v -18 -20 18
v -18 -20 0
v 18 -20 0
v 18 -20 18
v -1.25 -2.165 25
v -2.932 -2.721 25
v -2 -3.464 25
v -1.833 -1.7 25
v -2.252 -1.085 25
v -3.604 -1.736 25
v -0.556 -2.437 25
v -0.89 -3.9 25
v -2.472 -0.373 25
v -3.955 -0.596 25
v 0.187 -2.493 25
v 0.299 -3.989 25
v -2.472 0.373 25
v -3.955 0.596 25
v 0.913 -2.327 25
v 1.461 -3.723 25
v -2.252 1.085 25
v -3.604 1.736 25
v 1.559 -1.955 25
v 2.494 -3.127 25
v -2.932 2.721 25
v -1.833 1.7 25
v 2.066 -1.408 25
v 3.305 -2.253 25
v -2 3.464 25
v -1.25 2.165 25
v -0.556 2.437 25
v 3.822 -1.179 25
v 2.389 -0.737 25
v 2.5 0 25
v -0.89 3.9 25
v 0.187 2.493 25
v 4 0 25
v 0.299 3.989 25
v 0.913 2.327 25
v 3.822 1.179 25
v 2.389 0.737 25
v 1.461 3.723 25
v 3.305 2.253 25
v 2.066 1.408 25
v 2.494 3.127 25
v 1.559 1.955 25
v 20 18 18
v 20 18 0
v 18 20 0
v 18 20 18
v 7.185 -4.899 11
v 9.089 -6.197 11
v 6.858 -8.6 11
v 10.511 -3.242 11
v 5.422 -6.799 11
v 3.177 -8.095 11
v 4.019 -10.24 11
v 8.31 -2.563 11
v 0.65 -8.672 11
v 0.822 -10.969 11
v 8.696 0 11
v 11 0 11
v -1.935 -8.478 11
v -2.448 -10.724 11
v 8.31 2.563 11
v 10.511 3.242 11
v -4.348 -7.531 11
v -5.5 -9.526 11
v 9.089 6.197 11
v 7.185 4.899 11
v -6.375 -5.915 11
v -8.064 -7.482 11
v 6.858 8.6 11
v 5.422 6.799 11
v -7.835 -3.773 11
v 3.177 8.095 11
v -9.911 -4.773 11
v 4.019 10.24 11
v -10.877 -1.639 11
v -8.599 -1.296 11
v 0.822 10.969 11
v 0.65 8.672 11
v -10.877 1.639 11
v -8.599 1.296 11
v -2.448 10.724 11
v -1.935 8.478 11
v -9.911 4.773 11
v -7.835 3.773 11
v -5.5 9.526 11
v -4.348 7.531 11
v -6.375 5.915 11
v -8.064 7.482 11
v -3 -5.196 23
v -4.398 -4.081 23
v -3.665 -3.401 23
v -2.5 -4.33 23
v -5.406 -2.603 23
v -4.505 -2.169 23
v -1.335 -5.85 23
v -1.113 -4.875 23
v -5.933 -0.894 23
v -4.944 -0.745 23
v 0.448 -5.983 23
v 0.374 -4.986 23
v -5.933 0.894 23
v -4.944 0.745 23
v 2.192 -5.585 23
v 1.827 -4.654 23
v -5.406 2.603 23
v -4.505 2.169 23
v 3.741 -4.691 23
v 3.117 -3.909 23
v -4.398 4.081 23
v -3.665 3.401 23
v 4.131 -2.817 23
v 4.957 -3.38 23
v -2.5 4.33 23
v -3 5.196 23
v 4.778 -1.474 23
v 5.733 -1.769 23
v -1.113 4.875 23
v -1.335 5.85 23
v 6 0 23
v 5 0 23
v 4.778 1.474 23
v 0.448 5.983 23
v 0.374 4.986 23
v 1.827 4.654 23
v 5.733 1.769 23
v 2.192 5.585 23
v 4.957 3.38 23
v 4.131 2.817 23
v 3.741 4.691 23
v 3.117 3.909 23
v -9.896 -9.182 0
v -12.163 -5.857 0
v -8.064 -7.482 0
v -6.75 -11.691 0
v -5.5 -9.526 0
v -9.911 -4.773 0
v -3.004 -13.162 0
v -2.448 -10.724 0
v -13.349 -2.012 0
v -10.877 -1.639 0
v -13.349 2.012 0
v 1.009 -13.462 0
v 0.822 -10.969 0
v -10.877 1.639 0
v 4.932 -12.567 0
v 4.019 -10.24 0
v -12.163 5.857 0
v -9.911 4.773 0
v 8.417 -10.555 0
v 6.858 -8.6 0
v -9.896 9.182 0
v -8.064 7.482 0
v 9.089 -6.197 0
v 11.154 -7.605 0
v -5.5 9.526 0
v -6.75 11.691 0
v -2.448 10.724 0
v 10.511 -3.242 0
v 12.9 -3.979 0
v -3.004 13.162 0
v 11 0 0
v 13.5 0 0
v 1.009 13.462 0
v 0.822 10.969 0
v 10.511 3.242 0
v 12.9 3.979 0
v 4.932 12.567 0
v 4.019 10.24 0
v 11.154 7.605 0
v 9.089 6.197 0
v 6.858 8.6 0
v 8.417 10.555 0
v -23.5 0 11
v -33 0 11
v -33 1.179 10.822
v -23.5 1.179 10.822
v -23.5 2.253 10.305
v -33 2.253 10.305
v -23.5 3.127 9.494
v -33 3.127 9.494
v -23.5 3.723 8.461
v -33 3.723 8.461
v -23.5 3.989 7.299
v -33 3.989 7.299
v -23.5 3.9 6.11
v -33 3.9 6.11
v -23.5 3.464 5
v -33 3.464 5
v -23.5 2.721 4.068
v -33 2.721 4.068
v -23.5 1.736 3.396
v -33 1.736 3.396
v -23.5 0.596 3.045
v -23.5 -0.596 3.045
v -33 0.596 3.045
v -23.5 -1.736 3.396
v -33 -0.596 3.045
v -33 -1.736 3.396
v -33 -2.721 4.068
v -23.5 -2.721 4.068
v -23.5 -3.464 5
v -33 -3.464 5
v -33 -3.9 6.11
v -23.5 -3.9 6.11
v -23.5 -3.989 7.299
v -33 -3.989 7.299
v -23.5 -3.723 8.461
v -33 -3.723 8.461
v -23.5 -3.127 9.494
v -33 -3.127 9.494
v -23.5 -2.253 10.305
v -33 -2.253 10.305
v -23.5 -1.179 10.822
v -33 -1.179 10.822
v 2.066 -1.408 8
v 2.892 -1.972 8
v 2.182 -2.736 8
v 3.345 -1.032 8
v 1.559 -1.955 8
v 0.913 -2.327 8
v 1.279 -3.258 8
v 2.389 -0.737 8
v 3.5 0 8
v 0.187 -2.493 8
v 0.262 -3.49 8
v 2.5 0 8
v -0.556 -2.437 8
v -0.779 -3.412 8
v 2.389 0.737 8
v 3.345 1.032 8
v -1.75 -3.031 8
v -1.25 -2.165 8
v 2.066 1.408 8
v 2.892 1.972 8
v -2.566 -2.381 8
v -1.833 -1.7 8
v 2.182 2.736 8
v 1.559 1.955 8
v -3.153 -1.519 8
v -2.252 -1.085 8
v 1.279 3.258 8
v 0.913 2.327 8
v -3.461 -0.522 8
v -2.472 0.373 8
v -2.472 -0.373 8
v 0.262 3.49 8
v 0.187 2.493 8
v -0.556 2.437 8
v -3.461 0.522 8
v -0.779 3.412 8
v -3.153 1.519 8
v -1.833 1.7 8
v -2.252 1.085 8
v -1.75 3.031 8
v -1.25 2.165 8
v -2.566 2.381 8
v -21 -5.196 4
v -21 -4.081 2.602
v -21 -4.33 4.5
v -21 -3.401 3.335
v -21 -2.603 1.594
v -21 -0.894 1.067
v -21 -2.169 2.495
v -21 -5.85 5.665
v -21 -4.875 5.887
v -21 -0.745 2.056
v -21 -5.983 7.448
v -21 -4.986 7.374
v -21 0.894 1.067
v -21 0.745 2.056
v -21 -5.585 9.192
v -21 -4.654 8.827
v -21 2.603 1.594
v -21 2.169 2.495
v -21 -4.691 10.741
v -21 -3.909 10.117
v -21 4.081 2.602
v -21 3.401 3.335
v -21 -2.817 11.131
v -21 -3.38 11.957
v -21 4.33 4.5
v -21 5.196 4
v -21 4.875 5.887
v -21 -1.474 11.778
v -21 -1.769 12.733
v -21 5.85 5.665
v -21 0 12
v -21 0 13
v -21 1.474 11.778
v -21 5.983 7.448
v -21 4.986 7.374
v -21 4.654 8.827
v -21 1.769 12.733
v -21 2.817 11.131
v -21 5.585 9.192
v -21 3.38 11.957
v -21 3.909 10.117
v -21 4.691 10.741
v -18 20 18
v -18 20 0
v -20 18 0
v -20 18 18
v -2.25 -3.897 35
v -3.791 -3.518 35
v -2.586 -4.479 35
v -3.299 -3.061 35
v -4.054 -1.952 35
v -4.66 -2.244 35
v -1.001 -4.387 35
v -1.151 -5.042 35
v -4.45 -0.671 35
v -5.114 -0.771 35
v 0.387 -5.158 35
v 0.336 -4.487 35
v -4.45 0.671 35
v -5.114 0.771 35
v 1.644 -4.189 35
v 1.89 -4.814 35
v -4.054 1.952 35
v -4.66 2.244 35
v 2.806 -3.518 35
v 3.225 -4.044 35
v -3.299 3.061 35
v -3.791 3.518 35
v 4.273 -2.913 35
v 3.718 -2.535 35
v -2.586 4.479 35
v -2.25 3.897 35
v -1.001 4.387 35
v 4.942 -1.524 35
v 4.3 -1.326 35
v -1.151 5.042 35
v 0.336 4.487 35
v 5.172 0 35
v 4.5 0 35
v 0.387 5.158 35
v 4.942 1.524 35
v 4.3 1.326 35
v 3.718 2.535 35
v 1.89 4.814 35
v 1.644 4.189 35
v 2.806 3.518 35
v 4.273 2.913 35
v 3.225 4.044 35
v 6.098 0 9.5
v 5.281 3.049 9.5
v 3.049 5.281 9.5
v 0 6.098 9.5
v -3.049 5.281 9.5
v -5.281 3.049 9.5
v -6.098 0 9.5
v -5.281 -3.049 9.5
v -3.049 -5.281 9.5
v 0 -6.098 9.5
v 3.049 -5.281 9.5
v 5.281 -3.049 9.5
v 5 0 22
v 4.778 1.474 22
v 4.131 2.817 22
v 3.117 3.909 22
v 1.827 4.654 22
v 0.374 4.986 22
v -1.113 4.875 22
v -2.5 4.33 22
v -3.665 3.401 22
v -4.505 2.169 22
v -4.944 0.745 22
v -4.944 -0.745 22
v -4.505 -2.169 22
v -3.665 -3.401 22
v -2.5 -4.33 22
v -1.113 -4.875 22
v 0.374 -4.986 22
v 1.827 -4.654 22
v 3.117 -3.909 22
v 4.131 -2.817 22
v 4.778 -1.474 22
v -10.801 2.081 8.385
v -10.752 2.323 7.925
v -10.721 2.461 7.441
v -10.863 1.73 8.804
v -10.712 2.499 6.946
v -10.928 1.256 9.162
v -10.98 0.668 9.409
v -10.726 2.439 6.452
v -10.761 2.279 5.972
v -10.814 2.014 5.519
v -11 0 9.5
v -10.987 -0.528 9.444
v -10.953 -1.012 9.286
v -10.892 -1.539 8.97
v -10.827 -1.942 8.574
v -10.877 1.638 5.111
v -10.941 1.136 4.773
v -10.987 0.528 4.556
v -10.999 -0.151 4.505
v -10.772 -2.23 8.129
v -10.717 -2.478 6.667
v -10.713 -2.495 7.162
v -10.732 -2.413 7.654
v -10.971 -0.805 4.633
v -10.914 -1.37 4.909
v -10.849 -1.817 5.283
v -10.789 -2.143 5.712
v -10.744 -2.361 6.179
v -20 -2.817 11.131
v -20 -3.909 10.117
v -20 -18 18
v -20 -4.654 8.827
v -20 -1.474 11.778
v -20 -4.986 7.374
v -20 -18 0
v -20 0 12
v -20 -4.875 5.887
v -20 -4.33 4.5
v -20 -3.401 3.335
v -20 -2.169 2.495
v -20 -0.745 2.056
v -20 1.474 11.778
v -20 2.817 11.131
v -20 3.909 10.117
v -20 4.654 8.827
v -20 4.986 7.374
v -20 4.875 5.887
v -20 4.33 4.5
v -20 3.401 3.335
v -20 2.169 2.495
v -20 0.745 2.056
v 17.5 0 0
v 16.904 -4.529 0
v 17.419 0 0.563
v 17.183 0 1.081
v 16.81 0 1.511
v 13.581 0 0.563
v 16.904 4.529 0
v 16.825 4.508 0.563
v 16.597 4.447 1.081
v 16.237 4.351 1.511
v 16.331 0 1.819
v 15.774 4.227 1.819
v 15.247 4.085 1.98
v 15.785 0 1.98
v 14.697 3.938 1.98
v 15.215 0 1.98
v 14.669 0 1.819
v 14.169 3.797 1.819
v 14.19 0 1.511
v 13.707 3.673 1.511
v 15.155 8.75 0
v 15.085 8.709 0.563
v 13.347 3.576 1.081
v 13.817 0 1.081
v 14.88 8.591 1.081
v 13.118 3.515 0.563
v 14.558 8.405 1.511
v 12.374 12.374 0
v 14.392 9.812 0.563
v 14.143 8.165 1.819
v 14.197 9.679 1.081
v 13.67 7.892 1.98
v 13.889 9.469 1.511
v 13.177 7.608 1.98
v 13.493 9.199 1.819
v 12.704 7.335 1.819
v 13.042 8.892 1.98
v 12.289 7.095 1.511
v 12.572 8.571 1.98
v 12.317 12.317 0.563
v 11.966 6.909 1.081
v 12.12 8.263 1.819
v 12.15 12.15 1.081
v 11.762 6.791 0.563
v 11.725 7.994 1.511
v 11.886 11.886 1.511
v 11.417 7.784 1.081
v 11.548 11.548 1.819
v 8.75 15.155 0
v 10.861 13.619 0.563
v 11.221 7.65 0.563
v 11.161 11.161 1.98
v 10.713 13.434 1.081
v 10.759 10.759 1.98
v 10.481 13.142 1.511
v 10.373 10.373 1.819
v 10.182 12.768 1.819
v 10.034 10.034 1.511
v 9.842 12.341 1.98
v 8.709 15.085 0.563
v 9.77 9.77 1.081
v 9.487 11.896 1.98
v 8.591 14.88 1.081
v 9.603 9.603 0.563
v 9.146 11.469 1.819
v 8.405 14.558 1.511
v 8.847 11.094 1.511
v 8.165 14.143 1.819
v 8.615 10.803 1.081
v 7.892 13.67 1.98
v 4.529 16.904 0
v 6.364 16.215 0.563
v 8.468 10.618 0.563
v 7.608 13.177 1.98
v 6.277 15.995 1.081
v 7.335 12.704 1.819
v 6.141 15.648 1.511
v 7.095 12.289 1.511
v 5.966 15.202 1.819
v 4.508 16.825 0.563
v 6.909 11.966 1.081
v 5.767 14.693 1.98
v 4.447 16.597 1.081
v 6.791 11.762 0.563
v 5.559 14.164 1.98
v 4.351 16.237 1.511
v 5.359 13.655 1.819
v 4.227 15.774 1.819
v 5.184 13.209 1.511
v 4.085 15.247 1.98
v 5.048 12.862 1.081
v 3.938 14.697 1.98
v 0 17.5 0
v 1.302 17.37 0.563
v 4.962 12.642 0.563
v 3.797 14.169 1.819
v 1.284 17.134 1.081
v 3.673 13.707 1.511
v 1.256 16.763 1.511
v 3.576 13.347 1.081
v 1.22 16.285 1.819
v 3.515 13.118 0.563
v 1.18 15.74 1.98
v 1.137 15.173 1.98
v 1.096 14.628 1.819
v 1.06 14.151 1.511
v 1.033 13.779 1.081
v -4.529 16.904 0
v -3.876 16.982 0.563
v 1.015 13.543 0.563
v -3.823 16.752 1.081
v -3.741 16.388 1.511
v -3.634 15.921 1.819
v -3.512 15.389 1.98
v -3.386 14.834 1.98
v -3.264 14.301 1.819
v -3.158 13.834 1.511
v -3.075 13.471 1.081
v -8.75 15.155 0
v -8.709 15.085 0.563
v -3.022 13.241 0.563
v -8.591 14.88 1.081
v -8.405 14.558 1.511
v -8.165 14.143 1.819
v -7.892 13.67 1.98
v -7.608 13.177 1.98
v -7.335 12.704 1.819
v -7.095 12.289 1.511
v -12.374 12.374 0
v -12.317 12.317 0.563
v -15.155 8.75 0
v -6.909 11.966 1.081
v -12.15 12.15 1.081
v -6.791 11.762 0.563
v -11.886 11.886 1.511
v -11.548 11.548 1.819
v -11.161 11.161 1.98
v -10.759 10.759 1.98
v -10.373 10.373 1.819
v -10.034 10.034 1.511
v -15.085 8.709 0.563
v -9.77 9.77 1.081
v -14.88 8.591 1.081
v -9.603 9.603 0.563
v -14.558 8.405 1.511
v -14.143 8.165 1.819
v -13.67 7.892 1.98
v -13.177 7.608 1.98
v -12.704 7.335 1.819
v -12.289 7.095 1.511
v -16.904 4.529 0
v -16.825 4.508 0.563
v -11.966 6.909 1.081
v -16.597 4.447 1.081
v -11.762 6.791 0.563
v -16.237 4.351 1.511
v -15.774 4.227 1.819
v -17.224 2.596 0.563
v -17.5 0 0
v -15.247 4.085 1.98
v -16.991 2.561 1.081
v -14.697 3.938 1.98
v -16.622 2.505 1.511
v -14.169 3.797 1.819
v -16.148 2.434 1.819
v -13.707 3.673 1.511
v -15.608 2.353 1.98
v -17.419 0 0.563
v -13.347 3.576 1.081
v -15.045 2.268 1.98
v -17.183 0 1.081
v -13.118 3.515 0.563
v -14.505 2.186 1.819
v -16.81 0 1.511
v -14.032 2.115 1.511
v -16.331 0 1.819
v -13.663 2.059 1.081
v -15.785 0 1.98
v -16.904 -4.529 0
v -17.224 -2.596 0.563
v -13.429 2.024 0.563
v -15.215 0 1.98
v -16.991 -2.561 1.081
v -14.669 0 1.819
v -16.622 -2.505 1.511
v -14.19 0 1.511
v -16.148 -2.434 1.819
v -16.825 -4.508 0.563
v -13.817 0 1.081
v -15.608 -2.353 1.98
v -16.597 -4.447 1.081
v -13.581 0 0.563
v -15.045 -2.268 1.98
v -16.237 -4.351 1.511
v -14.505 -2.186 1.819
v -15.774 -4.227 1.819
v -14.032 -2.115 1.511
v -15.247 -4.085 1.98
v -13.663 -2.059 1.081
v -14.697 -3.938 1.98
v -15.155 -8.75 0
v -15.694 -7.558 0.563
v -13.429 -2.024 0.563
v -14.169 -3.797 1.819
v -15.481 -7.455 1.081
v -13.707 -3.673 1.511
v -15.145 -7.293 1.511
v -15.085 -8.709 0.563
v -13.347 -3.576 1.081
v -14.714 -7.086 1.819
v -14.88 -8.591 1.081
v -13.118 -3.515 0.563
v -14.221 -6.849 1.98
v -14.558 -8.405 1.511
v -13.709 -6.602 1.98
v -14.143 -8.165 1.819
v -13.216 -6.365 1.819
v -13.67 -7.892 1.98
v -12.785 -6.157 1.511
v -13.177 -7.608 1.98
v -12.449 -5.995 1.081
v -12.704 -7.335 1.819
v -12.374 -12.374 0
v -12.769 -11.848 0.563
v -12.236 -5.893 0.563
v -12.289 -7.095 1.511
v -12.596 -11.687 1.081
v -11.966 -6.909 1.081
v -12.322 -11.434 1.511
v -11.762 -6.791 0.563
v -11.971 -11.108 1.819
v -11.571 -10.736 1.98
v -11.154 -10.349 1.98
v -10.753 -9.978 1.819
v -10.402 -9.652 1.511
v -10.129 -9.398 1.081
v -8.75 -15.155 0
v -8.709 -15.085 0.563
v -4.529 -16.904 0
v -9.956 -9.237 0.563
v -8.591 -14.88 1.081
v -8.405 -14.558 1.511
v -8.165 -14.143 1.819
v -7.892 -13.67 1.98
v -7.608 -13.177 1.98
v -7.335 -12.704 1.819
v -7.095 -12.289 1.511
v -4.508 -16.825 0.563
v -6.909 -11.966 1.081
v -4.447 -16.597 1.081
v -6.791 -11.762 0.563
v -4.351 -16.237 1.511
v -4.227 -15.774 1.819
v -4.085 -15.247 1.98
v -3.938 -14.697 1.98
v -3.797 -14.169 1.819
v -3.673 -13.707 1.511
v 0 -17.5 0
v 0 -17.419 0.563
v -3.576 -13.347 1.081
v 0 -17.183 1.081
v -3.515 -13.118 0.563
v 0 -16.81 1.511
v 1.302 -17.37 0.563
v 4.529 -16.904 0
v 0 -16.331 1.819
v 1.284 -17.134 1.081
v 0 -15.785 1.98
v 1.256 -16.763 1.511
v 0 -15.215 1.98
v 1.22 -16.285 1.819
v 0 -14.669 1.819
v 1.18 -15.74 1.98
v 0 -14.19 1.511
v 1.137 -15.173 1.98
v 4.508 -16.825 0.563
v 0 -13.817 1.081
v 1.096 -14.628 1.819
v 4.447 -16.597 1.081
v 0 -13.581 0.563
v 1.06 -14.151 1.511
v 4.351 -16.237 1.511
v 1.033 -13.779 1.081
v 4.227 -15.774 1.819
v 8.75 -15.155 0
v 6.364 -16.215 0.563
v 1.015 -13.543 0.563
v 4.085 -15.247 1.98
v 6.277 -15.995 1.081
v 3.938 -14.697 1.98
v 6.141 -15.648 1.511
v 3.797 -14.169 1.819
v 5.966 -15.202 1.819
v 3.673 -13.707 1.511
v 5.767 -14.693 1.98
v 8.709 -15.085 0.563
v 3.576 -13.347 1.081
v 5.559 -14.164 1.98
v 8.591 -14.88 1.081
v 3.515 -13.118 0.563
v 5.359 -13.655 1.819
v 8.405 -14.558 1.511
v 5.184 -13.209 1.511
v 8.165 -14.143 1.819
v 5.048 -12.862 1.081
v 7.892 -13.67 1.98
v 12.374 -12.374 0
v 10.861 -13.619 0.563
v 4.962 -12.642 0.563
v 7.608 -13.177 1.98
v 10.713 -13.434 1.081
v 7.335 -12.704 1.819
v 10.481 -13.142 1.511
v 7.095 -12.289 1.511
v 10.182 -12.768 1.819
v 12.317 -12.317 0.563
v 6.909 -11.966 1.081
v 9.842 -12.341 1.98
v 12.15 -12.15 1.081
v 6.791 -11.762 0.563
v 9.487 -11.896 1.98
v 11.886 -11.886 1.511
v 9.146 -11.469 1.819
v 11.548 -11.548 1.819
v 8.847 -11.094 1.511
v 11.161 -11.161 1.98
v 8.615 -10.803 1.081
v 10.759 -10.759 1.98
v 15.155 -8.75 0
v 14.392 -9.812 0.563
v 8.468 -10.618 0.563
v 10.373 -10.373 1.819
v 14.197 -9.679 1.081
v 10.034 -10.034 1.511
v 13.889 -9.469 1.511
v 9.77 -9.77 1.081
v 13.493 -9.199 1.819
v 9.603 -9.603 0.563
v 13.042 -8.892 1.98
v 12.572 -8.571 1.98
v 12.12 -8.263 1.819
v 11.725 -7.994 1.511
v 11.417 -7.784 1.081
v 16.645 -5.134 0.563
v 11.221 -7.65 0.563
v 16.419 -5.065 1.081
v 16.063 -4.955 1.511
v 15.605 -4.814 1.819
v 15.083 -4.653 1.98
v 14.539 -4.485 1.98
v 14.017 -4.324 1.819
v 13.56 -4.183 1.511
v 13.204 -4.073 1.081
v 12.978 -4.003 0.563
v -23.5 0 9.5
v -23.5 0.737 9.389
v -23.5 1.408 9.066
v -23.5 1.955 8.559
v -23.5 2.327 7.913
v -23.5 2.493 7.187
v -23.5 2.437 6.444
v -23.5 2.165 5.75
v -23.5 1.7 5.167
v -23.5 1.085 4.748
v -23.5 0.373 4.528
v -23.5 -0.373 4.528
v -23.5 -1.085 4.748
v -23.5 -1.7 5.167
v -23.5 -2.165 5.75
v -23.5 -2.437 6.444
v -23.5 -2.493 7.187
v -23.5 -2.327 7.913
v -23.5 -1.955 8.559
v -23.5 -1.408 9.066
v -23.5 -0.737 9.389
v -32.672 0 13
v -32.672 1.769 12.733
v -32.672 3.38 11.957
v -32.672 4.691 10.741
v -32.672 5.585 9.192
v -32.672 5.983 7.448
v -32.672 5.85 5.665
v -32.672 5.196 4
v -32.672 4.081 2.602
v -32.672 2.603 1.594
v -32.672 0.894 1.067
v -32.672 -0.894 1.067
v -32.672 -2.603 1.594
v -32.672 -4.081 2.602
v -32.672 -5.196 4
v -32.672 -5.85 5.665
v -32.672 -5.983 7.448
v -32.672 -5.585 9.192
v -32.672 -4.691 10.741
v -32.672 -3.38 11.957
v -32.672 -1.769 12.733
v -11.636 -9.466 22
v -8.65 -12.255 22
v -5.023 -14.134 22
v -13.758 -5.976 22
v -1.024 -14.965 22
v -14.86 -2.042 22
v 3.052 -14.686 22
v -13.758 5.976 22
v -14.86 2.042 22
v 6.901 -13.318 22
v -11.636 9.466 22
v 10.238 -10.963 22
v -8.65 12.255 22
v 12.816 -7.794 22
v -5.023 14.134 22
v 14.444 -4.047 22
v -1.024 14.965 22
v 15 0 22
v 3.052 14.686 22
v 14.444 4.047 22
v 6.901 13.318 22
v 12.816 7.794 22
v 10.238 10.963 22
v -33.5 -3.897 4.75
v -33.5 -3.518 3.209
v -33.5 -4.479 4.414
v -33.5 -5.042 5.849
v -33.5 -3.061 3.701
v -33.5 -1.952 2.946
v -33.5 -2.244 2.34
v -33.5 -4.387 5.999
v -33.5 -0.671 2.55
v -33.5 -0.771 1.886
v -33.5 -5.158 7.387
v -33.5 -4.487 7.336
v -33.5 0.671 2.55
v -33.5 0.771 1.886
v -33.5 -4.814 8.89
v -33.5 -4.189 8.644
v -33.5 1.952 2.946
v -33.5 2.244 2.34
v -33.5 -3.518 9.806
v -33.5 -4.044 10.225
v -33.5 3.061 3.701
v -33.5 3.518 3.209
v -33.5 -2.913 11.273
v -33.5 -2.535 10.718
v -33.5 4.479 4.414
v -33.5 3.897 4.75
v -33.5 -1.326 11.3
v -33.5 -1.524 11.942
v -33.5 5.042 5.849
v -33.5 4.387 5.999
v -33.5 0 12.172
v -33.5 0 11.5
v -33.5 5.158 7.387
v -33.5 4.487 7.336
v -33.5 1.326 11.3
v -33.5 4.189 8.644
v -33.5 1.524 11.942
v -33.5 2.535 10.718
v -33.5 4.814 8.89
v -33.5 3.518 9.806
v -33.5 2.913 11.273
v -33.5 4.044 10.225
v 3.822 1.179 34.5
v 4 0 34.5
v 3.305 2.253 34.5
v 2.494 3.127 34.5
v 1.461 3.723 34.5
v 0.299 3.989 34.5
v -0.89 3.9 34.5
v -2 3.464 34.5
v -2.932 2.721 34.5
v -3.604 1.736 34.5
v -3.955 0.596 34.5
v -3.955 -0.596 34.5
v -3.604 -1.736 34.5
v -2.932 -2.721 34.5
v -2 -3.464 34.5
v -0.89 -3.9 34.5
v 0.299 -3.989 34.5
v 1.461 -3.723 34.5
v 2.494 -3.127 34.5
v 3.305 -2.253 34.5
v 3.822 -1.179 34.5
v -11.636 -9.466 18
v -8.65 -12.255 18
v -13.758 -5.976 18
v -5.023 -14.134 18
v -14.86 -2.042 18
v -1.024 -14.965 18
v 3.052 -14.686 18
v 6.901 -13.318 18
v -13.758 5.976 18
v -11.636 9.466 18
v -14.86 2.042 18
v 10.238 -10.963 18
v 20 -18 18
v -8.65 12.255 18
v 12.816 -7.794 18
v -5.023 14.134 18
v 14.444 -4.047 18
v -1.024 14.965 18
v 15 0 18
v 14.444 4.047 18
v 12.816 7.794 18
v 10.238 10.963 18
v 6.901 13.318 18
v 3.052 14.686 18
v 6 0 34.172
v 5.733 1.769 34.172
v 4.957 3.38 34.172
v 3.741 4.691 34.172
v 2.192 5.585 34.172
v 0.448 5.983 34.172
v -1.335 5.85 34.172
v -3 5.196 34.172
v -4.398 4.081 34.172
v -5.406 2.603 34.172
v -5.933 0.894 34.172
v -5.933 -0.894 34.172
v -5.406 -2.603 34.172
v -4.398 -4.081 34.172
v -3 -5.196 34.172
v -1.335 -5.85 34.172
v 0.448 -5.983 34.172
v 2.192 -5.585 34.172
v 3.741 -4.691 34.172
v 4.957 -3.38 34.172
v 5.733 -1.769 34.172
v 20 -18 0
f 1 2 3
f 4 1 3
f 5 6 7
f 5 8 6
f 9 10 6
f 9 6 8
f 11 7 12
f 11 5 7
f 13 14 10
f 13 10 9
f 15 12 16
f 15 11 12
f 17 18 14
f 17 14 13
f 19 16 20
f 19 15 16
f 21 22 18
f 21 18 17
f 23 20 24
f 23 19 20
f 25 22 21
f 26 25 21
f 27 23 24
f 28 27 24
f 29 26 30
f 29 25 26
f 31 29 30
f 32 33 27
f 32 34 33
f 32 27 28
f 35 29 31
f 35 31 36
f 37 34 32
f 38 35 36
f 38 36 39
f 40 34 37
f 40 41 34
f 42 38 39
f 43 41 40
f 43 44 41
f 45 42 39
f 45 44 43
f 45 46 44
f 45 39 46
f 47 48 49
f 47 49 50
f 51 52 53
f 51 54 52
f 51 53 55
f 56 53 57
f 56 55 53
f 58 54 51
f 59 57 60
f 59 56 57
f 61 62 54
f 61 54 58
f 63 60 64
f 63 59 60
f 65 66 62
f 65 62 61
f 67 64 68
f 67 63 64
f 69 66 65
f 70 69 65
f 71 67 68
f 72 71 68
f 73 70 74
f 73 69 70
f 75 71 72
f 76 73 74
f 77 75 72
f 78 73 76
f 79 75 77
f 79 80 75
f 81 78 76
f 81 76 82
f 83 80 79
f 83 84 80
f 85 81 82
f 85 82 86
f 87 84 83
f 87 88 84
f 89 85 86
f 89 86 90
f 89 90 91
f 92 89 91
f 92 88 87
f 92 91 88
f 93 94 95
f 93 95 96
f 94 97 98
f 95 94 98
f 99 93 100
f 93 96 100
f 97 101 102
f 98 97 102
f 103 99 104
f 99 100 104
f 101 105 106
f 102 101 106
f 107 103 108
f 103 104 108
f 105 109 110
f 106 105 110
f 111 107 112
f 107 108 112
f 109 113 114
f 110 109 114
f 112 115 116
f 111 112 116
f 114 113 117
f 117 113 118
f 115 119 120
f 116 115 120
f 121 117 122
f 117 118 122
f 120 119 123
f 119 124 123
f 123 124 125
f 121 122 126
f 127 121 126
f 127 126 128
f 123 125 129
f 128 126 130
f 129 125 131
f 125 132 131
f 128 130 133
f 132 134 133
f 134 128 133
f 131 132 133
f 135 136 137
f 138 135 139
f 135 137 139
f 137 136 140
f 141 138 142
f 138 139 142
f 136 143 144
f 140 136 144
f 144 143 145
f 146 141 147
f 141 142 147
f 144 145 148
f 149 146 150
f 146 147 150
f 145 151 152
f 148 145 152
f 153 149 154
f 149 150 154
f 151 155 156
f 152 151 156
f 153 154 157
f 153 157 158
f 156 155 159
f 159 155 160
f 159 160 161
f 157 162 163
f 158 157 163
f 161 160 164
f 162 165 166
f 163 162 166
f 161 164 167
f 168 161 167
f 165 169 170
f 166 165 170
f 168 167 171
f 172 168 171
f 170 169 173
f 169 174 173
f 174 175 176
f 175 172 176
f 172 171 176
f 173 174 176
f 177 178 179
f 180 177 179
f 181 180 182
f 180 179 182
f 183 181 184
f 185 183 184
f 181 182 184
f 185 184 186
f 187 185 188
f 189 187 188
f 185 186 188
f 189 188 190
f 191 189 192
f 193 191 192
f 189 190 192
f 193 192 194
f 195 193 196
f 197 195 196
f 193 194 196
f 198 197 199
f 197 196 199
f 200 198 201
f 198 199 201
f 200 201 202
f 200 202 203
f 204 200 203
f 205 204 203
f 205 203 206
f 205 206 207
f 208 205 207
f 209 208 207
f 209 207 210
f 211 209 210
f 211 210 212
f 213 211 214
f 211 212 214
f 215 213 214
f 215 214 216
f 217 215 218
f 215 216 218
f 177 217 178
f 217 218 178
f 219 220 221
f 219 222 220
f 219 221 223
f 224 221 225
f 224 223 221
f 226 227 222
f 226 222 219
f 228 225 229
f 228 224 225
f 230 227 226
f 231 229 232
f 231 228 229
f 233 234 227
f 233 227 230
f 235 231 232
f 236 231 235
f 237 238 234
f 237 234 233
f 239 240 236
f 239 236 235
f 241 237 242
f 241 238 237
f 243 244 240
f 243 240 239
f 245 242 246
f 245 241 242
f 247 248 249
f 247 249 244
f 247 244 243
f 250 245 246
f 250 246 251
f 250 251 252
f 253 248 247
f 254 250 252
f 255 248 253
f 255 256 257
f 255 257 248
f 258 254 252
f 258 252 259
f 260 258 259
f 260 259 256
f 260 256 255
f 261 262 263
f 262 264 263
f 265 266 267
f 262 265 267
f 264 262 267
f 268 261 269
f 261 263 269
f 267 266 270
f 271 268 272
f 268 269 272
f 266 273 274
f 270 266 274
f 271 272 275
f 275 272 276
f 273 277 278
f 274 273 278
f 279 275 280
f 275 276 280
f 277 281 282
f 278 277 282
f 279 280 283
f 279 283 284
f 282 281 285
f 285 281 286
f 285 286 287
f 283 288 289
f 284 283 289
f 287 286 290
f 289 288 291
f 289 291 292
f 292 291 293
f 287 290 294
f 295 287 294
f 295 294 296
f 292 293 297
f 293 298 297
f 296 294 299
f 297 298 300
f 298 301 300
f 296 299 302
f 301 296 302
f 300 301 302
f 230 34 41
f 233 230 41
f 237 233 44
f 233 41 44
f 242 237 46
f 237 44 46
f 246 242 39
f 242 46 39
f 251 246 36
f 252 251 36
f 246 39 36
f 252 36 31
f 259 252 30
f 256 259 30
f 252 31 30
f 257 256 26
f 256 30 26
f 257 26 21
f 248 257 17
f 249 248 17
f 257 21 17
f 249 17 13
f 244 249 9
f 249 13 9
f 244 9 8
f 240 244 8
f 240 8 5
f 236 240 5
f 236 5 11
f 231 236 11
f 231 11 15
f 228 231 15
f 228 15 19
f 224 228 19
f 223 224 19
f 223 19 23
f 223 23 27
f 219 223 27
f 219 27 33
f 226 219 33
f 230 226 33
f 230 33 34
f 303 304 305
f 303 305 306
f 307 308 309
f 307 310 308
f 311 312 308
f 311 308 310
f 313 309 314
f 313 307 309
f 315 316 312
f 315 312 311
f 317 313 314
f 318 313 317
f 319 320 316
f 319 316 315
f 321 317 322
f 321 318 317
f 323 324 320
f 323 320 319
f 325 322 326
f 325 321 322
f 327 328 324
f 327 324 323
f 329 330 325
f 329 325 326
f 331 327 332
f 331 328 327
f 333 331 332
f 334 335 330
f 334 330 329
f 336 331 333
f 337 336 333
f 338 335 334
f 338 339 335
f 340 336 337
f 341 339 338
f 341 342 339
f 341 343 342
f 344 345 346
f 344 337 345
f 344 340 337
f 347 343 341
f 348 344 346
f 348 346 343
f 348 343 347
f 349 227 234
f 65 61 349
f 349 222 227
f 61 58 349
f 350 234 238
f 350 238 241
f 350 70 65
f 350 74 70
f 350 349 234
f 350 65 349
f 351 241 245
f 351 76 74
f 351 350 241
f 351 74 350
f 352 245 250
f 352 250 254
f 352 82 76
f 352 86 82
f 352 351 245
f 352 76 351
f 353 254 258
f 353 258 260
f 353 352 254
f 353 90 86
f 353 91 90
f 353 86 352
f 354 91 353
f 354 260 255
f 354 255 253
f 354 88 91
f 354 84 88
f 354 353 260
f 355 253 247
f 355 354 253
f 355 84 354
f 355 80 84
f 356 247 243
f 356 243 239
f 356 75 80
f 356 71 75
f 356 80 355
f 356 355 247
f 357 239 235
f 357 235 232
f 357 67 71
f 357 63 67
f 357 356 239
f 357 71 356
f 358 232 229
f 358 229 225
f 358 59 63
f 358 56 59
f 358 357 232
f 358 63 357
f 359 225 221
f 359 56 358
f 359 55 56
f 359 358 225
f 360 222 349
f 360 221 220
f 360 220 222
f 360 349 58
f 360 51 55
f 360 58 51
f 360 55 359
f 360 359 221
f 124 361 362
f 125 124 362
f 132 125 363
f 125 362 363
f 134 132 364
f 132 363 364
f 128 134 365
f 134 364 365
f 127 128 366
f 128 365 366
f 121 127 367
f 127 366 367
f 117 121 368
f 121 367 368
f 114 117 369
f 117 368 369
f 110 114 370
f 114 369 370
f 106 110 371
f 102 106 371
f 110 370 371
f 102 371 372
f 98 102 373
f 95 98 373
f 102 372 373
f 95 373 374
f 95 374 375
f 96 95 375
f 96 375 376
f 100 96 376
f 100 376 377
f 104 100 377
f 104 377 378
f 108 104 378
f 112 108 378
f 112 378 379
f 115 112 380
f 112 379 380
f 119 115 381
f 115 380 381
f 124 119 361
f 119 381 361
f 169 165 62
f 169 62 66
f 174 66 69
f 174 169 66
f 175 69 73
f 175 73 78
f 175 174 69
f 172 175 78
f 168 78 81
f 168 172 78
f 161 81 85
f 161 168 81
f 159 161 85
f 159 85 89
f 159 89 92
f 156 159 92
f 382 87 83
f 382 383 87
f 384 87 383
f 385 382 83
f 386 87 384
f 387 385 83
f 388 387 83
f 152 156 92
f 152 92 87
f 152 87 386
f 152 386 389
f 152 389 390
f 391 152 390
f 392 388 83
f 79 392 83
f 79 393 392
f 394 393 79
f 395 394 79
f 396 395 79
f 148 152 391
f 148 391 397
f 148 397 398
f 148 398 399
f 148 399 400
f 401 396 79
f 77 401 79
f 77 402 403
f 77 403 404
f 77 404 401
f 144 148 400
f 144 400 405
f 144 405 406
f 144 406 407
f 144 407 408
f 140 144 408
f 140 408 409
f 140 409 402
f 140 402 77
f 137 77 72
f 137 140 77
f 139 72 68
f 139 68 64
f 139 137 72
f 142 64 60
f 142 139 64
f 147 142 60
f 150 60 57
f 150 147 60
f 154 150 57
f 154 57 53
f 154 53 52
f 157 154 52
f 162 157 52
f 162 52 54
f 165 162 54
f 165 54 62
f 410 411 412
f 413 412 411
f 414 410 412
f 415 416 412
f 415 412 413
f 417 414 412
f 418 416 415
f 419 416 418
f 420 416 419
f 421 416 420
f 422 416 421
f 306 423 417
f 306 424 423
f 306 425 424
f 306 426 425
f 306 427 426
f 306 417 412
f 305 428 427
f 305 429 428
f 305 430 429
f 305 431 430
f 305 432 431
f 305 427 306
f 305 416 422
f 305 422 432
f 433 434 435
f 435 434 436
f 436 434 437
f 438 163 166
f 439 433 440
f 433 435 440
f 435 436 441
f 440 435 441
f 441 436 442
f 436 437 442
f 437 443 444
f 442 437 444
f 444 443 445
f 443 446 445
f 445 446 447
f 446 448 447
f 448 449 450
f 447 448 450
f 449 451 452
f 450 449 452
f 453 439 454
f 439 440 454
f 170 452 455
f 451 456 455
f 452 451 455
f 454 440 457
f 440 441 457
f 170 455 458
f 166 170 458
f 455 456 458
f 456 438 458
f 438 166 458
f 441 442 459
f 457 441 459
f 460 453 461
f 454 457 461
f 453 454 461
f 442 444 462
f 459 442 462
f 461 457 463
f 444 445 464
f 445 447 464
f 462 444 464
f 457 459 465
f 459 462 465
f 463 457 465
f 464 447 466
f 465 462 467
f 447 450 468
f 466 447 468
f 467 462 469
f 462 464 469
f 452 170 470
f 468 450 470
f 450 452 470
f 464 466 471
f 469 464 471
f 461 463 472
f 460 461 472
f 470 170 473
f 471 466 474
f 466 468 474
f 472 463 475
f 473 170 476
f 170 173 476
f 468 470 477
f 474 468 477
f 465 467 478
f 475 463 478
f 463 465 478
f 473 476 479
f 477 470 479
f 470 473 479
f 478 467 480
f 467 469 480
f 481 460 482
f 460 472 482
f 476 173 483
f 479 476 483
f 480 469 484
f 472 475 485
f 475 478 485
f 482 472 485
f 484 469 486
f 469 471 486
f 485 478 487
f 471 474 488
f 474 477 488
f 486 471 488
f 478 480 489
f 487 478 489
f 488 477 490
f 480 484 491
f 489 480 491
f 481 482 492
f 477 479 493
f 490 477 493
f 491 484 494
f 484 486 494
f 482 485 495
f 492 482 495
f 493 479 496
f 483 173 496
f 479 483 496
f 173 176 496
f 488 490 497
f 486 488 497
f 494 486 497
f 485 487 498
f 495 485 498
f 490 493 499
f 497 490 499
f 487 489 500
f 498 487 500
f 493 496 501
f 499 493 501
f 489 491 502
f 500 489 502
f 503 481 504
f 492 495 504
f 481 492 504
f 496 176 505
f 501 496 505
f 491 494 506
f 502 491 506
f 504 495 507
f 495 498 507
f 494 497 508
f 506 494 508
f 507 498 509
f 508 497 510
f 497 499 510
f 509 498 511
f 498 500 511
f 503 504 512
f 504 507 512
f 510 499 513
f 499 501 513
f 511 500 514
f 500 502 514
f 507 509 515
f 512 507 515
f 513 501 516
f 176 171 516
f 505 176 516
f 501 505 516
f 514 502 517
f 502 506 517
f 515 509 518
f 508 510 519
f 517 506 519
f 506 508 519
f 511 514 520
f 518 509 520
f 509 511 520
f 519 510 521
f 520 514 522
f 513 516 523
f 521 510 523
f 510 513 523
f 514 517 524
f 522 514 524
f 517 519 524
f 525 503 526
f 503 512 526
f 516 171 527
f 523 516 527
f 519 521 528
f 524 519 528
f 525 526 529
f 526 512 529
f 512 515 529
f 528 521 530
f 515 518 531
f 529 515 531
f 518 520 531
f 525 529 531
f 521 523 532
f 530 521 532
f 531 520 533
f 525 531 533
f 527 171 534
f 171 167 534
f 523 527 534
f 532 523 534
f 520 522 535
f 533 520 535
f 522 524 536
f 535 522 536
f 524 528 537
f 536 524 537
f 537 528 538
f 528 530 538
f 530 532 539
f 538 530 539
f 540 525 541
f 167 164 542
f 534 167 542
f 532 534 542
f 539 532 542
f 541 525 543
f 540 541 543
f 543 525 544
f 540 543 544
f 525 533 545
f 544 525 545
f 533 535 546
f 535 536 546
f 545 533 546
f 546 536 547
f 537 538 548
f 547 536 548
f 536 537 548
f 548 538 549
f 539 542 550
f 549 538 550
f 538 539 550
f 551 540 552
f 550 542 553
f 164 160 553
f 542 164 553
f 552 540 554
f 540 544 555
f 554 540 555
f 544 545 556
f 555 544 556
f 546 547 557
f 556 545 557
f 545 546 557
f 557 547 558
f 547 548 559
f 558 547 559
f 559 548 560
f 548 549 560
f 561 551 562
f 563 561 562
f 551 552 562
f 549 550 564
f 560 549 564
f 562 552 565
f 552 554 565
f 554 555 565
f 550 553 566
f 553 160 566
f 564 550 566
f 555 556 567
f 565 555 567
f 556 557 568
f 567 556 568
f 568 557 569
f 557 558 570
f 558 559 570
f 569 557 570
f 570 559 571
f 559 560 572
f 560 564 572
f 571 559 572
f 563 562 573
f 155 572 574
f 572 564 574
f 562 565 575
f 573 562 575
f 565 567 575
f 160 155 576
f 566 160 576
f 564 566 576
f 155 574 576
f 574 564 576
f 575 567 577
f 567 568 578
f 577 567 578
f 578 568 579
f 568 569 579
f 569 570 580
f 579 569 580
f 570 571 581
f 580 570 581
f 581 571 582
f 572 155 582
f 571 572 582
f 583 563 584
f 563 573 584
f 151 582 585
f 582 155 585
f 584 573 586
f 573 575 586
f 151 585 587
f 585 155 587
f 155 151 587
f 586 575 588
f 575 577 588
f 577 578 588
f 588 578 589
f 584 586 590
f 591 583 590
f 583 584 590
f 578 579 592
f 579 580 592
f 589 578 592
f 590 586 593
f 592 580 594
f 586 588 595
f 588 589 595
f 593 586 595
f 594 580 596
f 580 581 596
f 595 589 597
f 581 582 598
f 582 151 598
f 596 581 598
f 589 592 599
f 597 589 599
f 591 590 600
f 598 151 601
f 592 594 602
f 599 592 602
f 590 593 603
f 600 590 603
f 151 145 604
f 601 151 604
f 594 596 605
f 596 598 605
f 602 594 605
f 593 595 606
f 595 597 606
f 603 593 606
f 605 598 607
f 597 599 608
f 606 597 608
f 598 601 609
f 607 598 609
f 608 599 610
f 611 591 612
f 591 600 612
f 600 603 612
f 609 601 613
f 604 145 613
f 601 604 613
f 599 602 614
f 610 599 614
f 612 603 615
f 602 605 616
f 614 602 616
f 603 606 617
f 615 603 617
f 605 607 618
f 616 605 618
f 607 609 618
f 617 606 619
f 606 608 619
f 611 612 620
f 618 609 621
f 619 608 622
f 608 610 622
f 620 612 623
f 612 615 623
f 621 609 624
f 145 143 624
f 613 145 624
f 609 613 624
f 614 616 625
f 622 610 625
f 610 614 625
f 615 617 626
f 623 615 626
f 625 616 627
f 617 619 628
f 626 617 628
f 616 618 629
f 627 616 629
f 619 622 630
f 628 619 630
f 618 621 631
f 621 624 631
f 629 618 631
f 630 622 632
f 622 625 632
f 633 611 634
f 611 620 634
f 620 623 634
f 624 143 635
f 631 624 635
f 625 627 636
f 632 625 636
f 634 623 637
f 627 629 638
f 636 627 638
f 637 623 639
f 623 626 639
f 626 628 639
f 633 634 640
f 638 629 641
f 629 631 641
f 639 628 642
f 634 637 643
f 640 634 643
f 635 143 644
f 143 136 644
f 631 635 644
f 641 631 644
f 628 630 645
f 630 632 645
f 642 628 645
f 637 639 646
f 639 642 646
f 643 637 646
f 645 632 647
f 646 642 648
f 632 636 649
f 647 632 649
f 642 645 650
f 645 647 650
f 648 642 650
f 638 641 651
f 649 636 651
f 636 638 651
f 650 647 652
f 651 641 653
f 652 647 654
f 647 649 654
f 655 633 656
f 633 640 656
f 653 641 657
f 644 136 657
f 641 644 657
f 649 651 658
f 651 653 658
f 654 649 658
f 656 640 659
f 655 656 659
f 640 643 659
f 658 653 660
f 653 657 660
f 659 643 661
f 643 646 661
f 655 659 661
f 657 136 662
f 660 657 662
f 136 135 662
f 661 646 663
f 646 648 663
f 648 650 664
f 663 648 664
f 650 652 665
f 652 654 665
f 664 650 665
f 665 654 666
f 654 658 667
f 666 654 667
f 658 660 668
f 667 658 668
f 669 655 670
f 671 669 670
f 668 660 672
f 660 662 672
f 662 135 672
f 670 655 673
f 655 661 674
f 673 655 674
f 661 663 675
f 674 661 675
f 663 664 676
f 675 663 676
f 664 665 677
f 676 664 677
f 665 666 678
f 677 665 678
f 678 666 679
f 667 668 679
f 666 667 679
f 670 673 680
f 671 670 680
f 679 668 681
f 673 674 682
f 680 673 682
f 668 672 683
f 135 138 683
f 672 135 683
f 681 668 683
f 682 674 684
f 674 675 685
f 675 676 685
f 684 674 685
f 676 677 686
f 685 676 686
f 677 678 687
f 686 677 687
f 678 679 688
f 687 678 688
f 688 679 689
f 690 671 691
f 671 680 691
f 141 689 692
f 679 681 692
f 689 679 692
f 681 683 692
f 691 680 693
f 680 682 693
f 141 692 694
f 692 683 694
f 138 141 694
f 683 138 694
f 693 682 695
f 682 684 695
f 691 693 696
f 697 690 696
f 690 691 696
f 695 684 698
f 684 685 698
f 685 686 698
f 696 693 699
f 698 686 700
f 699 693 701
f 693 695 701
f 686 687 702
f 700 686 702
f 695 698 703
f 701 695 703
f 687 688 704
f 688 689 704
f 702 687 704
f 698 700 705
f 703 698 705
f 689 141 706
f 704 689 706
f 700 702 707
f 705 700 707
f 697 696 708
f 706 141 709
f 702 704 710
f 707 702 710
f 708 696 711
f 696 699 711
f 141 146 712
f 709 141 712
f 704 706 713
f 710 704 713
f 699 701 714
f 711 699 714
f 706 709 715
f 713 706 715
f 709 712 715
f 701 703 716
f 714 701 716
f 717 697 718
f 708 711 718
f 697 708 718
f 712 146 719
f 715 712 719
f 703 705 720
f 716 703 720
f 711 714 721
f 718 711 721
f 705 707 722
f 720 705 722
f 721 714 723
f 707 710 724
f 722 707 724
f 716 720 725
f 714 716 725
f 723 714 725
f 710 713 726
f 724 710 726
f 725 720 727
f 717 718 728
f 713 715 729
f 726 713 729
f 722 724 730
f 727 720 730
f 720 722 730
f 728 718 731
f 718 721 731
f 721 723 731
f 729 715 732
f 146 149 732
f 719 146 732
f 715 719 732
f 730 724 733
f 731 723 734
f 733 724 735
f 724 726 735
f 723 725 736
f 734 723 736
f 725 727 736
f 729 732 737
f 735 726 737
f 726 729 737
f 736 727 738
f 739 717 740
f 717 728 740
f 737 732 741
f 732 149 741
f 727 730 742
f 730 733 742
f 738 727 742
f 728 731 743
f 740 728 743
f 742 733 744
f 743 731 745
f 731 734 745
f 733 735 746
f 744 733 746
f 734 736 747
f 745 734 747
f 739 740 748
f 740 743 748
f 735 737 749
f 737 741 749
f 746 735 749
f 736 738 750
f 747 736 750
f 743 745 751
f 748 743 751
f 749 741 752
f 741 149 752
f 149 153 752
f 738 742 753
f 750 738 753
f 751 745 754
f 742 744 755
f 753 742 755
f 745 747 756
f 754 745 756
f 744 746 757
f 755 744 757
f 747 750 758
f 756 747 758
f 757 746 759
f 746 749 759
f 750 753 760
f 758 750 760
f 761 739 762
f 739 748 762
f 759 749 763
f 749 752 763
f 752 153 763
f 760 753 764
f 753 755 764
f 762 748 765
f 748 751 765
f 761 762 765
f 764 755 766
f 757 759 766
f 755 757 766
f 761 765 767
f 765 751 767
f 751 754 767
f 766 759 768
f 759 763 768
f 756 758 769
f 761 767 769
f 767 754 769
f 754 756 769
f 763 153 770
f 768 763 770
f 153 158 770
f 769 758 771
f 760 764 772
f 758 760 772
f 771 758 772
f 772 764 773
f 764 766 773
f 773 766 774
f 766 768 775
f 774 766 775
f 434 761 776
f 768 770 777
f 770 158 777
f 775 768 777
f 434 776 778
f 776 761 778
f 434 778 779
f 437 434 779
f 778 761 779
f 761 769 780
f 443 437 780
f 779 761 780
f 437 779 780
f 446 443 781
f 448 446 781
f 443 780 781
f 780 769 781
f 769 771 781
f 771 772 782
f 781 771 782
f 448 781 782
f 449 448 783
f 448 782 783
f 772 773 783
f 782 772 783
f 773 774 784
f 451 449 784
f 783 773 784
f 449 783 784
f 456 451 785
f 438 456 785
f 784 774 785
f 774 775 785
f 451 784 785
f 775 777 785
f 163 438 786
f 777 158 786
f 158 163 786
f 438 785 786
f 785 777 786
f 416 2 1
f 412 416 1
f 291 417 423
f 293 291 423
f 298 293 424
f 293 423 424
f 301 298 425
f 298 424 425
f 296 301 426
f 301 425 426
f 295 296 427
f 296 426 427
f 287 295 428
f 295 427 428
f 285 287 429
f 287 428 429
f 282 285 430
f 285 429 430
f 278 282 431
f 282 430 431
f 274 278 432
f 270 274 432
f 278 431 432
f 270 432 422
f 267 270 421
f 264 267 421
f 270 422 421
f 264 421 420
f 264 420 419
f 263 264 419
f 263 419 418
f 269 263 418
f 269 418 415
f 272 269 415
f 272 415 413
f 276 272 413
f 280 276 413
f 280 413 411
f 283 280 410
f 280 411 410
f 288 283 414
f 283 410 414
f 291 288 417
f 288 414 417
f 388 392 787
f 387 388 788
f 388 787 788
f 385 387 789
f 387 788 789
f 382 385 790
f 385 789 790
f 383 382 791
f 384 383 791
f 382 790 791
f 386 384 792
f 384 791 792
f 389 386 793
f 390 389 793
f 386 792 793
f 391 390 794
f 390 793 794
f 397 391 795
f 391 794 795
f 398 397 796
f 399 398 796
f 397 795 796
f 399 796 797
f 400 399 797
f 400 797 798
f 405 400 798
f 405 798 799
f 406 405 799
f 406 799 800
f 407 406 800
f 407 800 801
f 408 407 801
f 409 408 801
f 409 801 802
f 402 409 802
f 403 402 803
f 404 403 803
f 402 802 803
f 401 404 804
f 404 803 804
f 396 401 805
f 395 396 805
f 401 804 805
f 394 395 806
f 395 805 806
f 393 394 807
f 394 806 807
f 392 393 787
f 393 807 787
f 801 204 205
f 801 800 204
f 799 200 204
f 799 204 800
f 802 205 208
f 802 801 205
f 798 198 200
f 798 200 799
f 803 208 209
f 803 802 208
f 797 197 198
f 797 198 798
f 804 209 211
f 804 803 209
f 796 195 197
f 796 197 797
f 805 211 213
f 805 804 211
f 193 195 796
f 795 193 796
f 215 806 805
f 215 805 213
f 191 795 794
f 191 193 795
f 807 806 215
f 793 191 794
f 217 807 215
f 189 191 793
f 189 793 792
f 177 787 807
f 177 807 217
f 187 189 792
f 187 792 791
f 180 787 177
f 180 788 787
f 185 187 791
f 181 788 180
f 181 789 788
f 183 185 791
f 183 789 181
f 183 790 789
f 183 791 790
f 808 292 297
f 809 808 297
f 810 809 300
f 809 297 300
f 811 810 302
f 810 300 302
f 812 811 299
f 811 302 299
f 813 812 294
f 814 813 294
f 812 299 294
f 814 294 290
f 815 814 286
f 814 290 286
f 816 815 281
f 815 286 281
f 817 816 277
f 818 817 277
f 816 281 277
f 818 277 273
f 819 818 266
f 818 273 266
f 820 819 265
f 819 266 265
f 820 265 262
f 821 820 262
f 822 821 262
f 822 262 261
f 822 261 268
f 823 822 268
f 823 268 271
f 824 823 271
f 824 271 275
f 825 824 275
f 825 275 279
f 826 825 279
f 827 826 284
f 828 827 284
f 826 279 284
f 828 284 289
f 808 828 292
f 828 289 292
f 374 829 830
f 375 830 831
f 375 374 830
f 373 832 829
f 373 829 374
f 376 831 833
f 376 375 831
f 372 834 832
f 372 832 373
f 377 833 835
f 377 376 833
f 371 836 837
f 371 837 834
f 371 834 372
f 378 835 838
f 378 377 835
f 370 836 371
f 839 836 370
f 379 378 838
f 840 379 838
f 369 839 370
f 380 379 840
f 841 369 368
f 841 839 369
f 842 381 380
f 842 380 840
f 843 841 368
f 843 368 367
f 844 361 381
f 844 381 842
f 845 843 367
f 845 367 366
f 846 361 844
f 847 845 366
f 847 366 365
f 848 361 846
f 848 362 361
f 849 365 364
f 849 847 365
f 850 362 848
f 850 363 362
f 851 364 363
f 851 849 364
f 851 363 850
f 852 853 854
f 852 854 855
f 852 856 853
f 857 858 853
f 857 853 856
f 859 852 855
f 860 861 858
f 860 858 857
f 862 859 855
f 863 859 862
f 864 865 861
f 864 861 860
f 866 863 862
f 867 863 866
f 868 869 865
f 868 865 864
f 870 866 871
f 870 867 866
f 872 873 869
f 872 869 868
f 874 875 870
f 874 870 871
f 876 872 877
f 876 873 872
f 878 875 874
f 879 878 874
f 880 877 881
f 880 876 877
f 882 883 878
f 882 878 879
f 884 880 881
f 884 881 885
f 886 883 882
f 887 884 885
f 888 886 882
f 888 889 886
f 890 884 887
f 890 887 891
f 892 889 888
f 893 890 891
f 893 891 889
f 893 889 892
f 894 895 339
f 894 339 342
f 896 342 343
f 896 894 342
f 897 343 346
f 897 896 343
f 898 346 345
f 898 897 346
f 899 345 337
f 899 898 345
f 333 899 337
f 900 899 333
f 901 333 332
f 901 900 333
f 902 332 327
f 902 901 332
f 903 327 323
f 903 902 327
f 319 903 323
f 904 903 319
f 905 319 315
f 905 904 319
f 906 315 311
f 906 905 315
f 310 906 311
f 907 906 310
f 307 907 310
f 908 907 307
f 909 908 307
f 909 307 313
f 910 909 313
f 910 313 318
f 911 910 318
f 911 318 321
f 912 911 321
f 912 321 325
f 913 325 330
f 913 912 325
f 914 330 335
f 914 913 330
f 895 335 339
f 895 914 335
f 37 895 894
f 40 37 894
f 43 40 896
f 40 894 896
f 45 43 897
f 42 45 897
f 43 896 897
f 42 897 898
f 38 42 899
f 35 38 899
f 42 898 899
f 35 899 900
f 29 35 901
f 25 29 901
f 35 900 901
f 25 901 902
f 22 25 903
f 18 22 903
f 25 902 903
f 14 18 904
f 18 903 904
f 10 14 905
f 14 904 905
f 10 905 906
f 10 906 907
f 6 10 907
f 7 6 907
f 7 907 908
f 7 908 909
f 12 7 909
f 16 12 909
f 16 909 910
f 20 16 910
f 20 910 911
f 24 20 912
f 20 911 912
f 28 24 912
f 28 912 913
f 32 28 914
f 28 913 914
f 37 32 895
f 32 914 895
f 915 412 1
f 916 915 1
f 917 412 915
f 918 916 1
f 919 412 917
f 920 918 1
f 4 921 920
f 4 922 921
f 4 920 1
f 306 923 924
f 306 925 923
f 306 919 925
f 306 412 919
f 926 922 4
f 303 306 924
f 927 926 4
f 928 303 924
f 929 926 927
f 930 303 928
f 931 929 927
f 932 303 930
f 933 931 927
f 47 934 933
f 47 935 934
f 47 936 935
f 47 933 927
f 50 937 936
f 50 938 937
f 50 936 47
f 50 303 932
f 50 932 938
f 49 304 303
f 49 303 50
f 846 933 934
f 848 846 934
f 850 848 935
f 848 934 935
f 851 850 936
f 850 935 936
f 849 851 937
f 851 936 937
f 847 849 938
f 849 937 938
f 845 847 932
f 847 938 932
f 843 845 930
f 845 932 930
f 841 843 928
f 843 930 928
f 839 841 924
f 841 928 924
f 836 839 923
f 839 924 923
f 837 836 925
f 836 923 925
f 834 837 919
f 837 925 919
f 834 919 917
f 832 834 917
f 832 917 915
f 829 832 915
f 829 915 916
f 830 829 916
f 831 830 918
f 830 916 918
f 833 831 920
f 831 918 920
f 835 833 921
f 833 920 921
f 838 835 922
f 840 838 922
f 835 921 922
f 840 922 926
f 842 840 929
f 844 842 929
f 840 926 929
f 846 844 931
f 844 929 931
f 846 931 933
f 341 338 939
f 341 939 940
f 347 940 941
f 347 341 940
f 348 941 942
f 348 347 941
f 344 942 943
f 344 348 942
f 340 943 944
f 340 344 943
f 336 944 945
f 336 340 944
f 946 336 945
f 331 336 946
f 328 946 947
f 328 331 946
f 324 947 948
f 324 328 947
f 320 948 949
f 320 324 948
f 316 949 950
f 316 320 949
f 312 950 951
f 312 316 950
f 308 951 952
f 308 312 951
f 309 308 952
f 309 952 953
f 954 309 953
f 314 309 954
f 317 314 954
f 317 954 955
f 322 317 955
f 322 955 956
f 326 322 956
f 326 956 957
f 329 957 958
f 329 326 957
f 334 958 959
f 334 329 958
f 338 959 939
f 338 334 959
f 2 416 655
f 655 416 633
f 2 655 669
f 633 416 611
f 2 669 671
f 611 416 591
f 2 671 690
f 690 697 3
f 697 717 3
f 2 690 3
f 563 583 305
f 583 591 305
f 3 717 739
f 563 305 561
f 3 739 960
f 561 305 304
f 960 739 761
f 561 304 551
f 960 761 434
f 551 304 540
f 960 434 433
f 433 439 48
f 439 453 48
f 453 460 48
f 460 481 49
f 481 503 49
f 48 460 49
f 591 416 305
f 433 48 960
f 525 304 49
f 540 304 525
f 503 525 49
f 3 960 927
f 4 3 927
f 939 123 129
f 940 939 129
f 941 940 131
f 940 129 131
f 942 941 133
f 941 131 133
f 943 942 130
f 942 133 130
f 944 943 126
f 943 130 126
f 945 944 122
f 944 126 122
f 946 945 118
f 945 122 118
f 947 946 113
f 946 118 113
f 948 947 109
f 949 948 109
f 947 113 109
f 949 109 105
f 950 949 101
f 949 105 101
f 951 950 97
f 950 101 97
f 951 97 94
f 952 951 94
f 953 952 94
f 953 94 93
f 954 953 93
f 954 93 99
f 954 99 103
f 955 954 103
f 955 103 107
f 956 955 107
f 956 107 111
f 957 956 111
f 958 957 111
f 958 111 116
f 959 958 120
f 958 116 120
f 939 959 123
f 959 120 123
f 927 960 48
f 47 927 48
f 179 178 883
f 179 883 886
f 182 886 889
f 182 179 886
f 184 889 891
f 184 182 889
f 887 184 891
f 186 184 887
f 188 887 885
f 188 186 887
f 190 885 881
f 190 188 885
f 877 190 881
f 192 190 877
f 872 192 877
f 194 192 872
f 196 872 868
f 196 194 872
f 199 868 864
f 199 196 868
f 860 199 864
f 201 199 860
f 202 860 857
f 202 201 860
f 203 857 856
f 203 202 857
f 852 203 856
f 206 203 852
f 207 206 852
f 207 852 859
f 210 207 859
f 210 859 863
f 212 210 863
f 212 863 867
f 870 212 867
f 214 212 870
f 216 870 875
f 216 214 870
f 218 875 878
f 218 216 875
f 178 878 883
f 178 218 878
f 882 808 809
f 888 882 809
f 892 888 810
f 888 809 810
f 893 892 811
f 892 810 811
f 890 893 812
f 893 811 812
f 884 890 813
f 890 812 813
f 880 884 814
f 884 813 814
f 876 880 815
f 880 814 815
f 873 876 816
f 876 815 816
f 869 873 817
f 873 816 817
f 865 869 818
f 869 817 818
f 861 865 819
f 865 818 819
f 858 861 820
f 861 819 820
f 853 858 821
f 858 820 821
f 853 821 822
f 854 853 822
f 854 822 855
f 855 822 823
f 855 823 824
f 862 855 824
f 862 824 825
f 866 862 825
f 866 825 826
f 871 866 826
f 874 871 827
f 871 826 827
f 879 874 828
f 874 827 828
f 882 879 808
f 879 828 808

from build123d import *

# Parameters (mm, degrees)
SKETCH_1_W          = 40
SKETCH_1_H          = 40
EXTRUDE_1_DEPTH     = 18
SKETCH_2_R          = 15
EXTRUDE_2_DEPTH     = 4
SKETCH_3_R          = 5
EXTRUDE_3_DEPTH     = 1
SKETCH_4_R          = 6
EXTRUDE_4_DEPTH     = 12
SKETCH_5_R          = 5
EXTRUDE_5_DEPTH     = 1
SKETCH_6_R          = 6
EXTRUDE_6_DEPTH     = 12.5
SKETCH_8_R          = 2.5
CUT_EXTRUDE_1_DEPTH = 36
SKETCH_9_R          = 4
CUT_EXTRUDE_2_DEPTH = 10
CUT_EXTRUDE_3_REACH = 55.5
SKETCH_10_R         = 2.5
SKETCH_11_R         = 4
CUT_EXTRUDE_4_DEPTH = 10
CHAMFER_1_SIZE      = 0.5
CHAMFER_2_SIZE      = 0.828
CHAMFER_3_SIZE      = 2


with BuildPart() as part:
    # Эскиз1 → Бобышка-Вытянуть1 (new body)
    with BuildSketch(Plane.XY):
        Rectangle(SKETCH_1_W, SKETCH_1_H)
    extrude(amount=EXTRUDE_1_DEPTH)

    # Эскиз2 → Бобышка-Вытянуть2 (add)
    with BuildSketch(Plane.XY.offset(18)):
        Circle(SKETCH_2_R)
    extrude(amount=EXTRUDE_2_DEPTH)

    # Эскиз3 → Бобышка-Вытянуть3 (add)
    with BuildSketch(Plane.XY.offset(22)):
        Circle(SKETCH_3_R)
    extrude(amount=EXTRUDE_3_DEPTH)

    # Эскиз4 → Бобышка-Вытянуть4 (add)
    with BuildSketch(Plane.XY.offset(23)):
        Circle(SKETCH_4_R)
    extrude(amount=EXTRUDE_4_DEPTH)

    # Эскиз5 → Бобышка-Вытянуть5 (add)
    with BuildSketch(Plane.ZY.offset(20)):
        with Locations((7, 0)):
            Circle(SKETCH_5_R)
    extrude(amount=EXTRUDE_5_DEPTH)

    # Эскиз6 → Бобышка-Вытянуть6 (add)
    with BuildSketch(Plane.ZY.offset(21)):
        with Locations((7, 0)):
            Circle(SKETCH_6_R)
    extrude(amount=EXTRUDE_6_DEPTH)

    # Эскиз7 → Вырез-Повернуть1 (revolve, cut)
    with BuildSketch(Plane(origin=(0, 0, 0), x_dir=(1, 0, 0), z_dir=(0, 1, 0))):
        Polygon((0, 0), (0, -8), (3.5, -8), (8.696152423, -11), (11, -11), (11, 0), align=None)
    revolve(axis=Axis((0, 0, 0), (0, 0, 1)), mode=Mode.SUBTRACT)

    # Эскиз8 → Вырез-Вытянуть1 (cut, through all)
    with BuildSketch(Plane.XY.offset(35)):
        Circle(SKETCH_8_R)
    extrude(amount=-CUT_EXTRUDE_1_DEPTH, mode=Mode.SUBTRACT)

    # Эскиз9 → Вырез-Вытянуть2 (cut)
    with BuildSketch(Plane.XY.offset(35)):
        Circle(SKETCH_9_R)
    extrude(amount=-CUT_EXTRUDE_2_DEPTH, mode=Mode.SUBTRACT)

    # Эскиз10 → Вырез-Вытянуть3 (cut, up to next)
    with BuildSketch(Plane.ZY.offset(33.5), mode=Mode.PRIVATE) as cut_extrude_3_sk1:
        with Locations((7, 0)):
            Circle(SKETCH_10_R)
    cut_extrude_3_tool1 = extrude(cut_extrude_3_sk1.sketch, amount=-CUT_EXTRUDE_3_REACH, mode=Mode.PRIVATE) & part.part
    add(cut_extrude_3_tool1.solids().sort_by_distance((-33.5, 0, 7))[0], mode=Mode.SUBTRACT)

    # Эскиз11 → Вырез-Вытянуть4 (cut)
    with BuildSketch(Plane.ZY.offset(33.5)):
        with Locations((7, 0)):
            Circle(SKETCH_11_R)
    extrude(amount=-CUT_EXTRUDE_4_DEPTH, mode=Mode.SUBTRACT)

    # Фаска1
    chamfer_1_edges = [part.edges().sort_by_distance(p)[0] for p in [
        (-4, 0, 35),
        (-33.5, 0, 3),
    ]]
    chamfer(chamfer_1_edges, length=CHAMFER_1_SIZE)

    # Фаска2
    chamfer_2_edges = [part.edges().sort_by_distance(p)[0] for p in [
        (-6, 0, 35),
        (-33.5, 0, 1),
    ]]
    chamfer(chamfer_2_edges, length=CHAMFER_2_SIZE)

    # Фаска3
    chamfer_3_edges = [part.edges().sort_by_distance(p)[0] for p in [
        (20, -20, 9),
        (-20, -20, 9),
        (-20, 20, 9),
        (20, 20, 9),
    ]]
    chamfer(chamfer_3_edges, length=CHAMFER_3_SIZE)

    # Эскиз12 → Вырез-Повернуть2 (revolve, cut)
    with BuildSketch(Plane(origin=(0, 0, 0), x_dir=(1, 0, 0), z_dir=(0, 1, 0))):
        with BuildLine():
            Line((13.5, 0), (13.5, 3))
            ThreePointArc((13.5, 3), (15.5, 5), (17.5, 3))
            Line((17.5, 3), (17.5, 0))
            ThreePointArc((17.5, 0), (15.5, -2), (13.5, 0))
        make_face()
    revolve(axis=Axis((0, 0, 0), (0, 0, 1)), mode=Mode.SUBTRACT)


solid = part.part
